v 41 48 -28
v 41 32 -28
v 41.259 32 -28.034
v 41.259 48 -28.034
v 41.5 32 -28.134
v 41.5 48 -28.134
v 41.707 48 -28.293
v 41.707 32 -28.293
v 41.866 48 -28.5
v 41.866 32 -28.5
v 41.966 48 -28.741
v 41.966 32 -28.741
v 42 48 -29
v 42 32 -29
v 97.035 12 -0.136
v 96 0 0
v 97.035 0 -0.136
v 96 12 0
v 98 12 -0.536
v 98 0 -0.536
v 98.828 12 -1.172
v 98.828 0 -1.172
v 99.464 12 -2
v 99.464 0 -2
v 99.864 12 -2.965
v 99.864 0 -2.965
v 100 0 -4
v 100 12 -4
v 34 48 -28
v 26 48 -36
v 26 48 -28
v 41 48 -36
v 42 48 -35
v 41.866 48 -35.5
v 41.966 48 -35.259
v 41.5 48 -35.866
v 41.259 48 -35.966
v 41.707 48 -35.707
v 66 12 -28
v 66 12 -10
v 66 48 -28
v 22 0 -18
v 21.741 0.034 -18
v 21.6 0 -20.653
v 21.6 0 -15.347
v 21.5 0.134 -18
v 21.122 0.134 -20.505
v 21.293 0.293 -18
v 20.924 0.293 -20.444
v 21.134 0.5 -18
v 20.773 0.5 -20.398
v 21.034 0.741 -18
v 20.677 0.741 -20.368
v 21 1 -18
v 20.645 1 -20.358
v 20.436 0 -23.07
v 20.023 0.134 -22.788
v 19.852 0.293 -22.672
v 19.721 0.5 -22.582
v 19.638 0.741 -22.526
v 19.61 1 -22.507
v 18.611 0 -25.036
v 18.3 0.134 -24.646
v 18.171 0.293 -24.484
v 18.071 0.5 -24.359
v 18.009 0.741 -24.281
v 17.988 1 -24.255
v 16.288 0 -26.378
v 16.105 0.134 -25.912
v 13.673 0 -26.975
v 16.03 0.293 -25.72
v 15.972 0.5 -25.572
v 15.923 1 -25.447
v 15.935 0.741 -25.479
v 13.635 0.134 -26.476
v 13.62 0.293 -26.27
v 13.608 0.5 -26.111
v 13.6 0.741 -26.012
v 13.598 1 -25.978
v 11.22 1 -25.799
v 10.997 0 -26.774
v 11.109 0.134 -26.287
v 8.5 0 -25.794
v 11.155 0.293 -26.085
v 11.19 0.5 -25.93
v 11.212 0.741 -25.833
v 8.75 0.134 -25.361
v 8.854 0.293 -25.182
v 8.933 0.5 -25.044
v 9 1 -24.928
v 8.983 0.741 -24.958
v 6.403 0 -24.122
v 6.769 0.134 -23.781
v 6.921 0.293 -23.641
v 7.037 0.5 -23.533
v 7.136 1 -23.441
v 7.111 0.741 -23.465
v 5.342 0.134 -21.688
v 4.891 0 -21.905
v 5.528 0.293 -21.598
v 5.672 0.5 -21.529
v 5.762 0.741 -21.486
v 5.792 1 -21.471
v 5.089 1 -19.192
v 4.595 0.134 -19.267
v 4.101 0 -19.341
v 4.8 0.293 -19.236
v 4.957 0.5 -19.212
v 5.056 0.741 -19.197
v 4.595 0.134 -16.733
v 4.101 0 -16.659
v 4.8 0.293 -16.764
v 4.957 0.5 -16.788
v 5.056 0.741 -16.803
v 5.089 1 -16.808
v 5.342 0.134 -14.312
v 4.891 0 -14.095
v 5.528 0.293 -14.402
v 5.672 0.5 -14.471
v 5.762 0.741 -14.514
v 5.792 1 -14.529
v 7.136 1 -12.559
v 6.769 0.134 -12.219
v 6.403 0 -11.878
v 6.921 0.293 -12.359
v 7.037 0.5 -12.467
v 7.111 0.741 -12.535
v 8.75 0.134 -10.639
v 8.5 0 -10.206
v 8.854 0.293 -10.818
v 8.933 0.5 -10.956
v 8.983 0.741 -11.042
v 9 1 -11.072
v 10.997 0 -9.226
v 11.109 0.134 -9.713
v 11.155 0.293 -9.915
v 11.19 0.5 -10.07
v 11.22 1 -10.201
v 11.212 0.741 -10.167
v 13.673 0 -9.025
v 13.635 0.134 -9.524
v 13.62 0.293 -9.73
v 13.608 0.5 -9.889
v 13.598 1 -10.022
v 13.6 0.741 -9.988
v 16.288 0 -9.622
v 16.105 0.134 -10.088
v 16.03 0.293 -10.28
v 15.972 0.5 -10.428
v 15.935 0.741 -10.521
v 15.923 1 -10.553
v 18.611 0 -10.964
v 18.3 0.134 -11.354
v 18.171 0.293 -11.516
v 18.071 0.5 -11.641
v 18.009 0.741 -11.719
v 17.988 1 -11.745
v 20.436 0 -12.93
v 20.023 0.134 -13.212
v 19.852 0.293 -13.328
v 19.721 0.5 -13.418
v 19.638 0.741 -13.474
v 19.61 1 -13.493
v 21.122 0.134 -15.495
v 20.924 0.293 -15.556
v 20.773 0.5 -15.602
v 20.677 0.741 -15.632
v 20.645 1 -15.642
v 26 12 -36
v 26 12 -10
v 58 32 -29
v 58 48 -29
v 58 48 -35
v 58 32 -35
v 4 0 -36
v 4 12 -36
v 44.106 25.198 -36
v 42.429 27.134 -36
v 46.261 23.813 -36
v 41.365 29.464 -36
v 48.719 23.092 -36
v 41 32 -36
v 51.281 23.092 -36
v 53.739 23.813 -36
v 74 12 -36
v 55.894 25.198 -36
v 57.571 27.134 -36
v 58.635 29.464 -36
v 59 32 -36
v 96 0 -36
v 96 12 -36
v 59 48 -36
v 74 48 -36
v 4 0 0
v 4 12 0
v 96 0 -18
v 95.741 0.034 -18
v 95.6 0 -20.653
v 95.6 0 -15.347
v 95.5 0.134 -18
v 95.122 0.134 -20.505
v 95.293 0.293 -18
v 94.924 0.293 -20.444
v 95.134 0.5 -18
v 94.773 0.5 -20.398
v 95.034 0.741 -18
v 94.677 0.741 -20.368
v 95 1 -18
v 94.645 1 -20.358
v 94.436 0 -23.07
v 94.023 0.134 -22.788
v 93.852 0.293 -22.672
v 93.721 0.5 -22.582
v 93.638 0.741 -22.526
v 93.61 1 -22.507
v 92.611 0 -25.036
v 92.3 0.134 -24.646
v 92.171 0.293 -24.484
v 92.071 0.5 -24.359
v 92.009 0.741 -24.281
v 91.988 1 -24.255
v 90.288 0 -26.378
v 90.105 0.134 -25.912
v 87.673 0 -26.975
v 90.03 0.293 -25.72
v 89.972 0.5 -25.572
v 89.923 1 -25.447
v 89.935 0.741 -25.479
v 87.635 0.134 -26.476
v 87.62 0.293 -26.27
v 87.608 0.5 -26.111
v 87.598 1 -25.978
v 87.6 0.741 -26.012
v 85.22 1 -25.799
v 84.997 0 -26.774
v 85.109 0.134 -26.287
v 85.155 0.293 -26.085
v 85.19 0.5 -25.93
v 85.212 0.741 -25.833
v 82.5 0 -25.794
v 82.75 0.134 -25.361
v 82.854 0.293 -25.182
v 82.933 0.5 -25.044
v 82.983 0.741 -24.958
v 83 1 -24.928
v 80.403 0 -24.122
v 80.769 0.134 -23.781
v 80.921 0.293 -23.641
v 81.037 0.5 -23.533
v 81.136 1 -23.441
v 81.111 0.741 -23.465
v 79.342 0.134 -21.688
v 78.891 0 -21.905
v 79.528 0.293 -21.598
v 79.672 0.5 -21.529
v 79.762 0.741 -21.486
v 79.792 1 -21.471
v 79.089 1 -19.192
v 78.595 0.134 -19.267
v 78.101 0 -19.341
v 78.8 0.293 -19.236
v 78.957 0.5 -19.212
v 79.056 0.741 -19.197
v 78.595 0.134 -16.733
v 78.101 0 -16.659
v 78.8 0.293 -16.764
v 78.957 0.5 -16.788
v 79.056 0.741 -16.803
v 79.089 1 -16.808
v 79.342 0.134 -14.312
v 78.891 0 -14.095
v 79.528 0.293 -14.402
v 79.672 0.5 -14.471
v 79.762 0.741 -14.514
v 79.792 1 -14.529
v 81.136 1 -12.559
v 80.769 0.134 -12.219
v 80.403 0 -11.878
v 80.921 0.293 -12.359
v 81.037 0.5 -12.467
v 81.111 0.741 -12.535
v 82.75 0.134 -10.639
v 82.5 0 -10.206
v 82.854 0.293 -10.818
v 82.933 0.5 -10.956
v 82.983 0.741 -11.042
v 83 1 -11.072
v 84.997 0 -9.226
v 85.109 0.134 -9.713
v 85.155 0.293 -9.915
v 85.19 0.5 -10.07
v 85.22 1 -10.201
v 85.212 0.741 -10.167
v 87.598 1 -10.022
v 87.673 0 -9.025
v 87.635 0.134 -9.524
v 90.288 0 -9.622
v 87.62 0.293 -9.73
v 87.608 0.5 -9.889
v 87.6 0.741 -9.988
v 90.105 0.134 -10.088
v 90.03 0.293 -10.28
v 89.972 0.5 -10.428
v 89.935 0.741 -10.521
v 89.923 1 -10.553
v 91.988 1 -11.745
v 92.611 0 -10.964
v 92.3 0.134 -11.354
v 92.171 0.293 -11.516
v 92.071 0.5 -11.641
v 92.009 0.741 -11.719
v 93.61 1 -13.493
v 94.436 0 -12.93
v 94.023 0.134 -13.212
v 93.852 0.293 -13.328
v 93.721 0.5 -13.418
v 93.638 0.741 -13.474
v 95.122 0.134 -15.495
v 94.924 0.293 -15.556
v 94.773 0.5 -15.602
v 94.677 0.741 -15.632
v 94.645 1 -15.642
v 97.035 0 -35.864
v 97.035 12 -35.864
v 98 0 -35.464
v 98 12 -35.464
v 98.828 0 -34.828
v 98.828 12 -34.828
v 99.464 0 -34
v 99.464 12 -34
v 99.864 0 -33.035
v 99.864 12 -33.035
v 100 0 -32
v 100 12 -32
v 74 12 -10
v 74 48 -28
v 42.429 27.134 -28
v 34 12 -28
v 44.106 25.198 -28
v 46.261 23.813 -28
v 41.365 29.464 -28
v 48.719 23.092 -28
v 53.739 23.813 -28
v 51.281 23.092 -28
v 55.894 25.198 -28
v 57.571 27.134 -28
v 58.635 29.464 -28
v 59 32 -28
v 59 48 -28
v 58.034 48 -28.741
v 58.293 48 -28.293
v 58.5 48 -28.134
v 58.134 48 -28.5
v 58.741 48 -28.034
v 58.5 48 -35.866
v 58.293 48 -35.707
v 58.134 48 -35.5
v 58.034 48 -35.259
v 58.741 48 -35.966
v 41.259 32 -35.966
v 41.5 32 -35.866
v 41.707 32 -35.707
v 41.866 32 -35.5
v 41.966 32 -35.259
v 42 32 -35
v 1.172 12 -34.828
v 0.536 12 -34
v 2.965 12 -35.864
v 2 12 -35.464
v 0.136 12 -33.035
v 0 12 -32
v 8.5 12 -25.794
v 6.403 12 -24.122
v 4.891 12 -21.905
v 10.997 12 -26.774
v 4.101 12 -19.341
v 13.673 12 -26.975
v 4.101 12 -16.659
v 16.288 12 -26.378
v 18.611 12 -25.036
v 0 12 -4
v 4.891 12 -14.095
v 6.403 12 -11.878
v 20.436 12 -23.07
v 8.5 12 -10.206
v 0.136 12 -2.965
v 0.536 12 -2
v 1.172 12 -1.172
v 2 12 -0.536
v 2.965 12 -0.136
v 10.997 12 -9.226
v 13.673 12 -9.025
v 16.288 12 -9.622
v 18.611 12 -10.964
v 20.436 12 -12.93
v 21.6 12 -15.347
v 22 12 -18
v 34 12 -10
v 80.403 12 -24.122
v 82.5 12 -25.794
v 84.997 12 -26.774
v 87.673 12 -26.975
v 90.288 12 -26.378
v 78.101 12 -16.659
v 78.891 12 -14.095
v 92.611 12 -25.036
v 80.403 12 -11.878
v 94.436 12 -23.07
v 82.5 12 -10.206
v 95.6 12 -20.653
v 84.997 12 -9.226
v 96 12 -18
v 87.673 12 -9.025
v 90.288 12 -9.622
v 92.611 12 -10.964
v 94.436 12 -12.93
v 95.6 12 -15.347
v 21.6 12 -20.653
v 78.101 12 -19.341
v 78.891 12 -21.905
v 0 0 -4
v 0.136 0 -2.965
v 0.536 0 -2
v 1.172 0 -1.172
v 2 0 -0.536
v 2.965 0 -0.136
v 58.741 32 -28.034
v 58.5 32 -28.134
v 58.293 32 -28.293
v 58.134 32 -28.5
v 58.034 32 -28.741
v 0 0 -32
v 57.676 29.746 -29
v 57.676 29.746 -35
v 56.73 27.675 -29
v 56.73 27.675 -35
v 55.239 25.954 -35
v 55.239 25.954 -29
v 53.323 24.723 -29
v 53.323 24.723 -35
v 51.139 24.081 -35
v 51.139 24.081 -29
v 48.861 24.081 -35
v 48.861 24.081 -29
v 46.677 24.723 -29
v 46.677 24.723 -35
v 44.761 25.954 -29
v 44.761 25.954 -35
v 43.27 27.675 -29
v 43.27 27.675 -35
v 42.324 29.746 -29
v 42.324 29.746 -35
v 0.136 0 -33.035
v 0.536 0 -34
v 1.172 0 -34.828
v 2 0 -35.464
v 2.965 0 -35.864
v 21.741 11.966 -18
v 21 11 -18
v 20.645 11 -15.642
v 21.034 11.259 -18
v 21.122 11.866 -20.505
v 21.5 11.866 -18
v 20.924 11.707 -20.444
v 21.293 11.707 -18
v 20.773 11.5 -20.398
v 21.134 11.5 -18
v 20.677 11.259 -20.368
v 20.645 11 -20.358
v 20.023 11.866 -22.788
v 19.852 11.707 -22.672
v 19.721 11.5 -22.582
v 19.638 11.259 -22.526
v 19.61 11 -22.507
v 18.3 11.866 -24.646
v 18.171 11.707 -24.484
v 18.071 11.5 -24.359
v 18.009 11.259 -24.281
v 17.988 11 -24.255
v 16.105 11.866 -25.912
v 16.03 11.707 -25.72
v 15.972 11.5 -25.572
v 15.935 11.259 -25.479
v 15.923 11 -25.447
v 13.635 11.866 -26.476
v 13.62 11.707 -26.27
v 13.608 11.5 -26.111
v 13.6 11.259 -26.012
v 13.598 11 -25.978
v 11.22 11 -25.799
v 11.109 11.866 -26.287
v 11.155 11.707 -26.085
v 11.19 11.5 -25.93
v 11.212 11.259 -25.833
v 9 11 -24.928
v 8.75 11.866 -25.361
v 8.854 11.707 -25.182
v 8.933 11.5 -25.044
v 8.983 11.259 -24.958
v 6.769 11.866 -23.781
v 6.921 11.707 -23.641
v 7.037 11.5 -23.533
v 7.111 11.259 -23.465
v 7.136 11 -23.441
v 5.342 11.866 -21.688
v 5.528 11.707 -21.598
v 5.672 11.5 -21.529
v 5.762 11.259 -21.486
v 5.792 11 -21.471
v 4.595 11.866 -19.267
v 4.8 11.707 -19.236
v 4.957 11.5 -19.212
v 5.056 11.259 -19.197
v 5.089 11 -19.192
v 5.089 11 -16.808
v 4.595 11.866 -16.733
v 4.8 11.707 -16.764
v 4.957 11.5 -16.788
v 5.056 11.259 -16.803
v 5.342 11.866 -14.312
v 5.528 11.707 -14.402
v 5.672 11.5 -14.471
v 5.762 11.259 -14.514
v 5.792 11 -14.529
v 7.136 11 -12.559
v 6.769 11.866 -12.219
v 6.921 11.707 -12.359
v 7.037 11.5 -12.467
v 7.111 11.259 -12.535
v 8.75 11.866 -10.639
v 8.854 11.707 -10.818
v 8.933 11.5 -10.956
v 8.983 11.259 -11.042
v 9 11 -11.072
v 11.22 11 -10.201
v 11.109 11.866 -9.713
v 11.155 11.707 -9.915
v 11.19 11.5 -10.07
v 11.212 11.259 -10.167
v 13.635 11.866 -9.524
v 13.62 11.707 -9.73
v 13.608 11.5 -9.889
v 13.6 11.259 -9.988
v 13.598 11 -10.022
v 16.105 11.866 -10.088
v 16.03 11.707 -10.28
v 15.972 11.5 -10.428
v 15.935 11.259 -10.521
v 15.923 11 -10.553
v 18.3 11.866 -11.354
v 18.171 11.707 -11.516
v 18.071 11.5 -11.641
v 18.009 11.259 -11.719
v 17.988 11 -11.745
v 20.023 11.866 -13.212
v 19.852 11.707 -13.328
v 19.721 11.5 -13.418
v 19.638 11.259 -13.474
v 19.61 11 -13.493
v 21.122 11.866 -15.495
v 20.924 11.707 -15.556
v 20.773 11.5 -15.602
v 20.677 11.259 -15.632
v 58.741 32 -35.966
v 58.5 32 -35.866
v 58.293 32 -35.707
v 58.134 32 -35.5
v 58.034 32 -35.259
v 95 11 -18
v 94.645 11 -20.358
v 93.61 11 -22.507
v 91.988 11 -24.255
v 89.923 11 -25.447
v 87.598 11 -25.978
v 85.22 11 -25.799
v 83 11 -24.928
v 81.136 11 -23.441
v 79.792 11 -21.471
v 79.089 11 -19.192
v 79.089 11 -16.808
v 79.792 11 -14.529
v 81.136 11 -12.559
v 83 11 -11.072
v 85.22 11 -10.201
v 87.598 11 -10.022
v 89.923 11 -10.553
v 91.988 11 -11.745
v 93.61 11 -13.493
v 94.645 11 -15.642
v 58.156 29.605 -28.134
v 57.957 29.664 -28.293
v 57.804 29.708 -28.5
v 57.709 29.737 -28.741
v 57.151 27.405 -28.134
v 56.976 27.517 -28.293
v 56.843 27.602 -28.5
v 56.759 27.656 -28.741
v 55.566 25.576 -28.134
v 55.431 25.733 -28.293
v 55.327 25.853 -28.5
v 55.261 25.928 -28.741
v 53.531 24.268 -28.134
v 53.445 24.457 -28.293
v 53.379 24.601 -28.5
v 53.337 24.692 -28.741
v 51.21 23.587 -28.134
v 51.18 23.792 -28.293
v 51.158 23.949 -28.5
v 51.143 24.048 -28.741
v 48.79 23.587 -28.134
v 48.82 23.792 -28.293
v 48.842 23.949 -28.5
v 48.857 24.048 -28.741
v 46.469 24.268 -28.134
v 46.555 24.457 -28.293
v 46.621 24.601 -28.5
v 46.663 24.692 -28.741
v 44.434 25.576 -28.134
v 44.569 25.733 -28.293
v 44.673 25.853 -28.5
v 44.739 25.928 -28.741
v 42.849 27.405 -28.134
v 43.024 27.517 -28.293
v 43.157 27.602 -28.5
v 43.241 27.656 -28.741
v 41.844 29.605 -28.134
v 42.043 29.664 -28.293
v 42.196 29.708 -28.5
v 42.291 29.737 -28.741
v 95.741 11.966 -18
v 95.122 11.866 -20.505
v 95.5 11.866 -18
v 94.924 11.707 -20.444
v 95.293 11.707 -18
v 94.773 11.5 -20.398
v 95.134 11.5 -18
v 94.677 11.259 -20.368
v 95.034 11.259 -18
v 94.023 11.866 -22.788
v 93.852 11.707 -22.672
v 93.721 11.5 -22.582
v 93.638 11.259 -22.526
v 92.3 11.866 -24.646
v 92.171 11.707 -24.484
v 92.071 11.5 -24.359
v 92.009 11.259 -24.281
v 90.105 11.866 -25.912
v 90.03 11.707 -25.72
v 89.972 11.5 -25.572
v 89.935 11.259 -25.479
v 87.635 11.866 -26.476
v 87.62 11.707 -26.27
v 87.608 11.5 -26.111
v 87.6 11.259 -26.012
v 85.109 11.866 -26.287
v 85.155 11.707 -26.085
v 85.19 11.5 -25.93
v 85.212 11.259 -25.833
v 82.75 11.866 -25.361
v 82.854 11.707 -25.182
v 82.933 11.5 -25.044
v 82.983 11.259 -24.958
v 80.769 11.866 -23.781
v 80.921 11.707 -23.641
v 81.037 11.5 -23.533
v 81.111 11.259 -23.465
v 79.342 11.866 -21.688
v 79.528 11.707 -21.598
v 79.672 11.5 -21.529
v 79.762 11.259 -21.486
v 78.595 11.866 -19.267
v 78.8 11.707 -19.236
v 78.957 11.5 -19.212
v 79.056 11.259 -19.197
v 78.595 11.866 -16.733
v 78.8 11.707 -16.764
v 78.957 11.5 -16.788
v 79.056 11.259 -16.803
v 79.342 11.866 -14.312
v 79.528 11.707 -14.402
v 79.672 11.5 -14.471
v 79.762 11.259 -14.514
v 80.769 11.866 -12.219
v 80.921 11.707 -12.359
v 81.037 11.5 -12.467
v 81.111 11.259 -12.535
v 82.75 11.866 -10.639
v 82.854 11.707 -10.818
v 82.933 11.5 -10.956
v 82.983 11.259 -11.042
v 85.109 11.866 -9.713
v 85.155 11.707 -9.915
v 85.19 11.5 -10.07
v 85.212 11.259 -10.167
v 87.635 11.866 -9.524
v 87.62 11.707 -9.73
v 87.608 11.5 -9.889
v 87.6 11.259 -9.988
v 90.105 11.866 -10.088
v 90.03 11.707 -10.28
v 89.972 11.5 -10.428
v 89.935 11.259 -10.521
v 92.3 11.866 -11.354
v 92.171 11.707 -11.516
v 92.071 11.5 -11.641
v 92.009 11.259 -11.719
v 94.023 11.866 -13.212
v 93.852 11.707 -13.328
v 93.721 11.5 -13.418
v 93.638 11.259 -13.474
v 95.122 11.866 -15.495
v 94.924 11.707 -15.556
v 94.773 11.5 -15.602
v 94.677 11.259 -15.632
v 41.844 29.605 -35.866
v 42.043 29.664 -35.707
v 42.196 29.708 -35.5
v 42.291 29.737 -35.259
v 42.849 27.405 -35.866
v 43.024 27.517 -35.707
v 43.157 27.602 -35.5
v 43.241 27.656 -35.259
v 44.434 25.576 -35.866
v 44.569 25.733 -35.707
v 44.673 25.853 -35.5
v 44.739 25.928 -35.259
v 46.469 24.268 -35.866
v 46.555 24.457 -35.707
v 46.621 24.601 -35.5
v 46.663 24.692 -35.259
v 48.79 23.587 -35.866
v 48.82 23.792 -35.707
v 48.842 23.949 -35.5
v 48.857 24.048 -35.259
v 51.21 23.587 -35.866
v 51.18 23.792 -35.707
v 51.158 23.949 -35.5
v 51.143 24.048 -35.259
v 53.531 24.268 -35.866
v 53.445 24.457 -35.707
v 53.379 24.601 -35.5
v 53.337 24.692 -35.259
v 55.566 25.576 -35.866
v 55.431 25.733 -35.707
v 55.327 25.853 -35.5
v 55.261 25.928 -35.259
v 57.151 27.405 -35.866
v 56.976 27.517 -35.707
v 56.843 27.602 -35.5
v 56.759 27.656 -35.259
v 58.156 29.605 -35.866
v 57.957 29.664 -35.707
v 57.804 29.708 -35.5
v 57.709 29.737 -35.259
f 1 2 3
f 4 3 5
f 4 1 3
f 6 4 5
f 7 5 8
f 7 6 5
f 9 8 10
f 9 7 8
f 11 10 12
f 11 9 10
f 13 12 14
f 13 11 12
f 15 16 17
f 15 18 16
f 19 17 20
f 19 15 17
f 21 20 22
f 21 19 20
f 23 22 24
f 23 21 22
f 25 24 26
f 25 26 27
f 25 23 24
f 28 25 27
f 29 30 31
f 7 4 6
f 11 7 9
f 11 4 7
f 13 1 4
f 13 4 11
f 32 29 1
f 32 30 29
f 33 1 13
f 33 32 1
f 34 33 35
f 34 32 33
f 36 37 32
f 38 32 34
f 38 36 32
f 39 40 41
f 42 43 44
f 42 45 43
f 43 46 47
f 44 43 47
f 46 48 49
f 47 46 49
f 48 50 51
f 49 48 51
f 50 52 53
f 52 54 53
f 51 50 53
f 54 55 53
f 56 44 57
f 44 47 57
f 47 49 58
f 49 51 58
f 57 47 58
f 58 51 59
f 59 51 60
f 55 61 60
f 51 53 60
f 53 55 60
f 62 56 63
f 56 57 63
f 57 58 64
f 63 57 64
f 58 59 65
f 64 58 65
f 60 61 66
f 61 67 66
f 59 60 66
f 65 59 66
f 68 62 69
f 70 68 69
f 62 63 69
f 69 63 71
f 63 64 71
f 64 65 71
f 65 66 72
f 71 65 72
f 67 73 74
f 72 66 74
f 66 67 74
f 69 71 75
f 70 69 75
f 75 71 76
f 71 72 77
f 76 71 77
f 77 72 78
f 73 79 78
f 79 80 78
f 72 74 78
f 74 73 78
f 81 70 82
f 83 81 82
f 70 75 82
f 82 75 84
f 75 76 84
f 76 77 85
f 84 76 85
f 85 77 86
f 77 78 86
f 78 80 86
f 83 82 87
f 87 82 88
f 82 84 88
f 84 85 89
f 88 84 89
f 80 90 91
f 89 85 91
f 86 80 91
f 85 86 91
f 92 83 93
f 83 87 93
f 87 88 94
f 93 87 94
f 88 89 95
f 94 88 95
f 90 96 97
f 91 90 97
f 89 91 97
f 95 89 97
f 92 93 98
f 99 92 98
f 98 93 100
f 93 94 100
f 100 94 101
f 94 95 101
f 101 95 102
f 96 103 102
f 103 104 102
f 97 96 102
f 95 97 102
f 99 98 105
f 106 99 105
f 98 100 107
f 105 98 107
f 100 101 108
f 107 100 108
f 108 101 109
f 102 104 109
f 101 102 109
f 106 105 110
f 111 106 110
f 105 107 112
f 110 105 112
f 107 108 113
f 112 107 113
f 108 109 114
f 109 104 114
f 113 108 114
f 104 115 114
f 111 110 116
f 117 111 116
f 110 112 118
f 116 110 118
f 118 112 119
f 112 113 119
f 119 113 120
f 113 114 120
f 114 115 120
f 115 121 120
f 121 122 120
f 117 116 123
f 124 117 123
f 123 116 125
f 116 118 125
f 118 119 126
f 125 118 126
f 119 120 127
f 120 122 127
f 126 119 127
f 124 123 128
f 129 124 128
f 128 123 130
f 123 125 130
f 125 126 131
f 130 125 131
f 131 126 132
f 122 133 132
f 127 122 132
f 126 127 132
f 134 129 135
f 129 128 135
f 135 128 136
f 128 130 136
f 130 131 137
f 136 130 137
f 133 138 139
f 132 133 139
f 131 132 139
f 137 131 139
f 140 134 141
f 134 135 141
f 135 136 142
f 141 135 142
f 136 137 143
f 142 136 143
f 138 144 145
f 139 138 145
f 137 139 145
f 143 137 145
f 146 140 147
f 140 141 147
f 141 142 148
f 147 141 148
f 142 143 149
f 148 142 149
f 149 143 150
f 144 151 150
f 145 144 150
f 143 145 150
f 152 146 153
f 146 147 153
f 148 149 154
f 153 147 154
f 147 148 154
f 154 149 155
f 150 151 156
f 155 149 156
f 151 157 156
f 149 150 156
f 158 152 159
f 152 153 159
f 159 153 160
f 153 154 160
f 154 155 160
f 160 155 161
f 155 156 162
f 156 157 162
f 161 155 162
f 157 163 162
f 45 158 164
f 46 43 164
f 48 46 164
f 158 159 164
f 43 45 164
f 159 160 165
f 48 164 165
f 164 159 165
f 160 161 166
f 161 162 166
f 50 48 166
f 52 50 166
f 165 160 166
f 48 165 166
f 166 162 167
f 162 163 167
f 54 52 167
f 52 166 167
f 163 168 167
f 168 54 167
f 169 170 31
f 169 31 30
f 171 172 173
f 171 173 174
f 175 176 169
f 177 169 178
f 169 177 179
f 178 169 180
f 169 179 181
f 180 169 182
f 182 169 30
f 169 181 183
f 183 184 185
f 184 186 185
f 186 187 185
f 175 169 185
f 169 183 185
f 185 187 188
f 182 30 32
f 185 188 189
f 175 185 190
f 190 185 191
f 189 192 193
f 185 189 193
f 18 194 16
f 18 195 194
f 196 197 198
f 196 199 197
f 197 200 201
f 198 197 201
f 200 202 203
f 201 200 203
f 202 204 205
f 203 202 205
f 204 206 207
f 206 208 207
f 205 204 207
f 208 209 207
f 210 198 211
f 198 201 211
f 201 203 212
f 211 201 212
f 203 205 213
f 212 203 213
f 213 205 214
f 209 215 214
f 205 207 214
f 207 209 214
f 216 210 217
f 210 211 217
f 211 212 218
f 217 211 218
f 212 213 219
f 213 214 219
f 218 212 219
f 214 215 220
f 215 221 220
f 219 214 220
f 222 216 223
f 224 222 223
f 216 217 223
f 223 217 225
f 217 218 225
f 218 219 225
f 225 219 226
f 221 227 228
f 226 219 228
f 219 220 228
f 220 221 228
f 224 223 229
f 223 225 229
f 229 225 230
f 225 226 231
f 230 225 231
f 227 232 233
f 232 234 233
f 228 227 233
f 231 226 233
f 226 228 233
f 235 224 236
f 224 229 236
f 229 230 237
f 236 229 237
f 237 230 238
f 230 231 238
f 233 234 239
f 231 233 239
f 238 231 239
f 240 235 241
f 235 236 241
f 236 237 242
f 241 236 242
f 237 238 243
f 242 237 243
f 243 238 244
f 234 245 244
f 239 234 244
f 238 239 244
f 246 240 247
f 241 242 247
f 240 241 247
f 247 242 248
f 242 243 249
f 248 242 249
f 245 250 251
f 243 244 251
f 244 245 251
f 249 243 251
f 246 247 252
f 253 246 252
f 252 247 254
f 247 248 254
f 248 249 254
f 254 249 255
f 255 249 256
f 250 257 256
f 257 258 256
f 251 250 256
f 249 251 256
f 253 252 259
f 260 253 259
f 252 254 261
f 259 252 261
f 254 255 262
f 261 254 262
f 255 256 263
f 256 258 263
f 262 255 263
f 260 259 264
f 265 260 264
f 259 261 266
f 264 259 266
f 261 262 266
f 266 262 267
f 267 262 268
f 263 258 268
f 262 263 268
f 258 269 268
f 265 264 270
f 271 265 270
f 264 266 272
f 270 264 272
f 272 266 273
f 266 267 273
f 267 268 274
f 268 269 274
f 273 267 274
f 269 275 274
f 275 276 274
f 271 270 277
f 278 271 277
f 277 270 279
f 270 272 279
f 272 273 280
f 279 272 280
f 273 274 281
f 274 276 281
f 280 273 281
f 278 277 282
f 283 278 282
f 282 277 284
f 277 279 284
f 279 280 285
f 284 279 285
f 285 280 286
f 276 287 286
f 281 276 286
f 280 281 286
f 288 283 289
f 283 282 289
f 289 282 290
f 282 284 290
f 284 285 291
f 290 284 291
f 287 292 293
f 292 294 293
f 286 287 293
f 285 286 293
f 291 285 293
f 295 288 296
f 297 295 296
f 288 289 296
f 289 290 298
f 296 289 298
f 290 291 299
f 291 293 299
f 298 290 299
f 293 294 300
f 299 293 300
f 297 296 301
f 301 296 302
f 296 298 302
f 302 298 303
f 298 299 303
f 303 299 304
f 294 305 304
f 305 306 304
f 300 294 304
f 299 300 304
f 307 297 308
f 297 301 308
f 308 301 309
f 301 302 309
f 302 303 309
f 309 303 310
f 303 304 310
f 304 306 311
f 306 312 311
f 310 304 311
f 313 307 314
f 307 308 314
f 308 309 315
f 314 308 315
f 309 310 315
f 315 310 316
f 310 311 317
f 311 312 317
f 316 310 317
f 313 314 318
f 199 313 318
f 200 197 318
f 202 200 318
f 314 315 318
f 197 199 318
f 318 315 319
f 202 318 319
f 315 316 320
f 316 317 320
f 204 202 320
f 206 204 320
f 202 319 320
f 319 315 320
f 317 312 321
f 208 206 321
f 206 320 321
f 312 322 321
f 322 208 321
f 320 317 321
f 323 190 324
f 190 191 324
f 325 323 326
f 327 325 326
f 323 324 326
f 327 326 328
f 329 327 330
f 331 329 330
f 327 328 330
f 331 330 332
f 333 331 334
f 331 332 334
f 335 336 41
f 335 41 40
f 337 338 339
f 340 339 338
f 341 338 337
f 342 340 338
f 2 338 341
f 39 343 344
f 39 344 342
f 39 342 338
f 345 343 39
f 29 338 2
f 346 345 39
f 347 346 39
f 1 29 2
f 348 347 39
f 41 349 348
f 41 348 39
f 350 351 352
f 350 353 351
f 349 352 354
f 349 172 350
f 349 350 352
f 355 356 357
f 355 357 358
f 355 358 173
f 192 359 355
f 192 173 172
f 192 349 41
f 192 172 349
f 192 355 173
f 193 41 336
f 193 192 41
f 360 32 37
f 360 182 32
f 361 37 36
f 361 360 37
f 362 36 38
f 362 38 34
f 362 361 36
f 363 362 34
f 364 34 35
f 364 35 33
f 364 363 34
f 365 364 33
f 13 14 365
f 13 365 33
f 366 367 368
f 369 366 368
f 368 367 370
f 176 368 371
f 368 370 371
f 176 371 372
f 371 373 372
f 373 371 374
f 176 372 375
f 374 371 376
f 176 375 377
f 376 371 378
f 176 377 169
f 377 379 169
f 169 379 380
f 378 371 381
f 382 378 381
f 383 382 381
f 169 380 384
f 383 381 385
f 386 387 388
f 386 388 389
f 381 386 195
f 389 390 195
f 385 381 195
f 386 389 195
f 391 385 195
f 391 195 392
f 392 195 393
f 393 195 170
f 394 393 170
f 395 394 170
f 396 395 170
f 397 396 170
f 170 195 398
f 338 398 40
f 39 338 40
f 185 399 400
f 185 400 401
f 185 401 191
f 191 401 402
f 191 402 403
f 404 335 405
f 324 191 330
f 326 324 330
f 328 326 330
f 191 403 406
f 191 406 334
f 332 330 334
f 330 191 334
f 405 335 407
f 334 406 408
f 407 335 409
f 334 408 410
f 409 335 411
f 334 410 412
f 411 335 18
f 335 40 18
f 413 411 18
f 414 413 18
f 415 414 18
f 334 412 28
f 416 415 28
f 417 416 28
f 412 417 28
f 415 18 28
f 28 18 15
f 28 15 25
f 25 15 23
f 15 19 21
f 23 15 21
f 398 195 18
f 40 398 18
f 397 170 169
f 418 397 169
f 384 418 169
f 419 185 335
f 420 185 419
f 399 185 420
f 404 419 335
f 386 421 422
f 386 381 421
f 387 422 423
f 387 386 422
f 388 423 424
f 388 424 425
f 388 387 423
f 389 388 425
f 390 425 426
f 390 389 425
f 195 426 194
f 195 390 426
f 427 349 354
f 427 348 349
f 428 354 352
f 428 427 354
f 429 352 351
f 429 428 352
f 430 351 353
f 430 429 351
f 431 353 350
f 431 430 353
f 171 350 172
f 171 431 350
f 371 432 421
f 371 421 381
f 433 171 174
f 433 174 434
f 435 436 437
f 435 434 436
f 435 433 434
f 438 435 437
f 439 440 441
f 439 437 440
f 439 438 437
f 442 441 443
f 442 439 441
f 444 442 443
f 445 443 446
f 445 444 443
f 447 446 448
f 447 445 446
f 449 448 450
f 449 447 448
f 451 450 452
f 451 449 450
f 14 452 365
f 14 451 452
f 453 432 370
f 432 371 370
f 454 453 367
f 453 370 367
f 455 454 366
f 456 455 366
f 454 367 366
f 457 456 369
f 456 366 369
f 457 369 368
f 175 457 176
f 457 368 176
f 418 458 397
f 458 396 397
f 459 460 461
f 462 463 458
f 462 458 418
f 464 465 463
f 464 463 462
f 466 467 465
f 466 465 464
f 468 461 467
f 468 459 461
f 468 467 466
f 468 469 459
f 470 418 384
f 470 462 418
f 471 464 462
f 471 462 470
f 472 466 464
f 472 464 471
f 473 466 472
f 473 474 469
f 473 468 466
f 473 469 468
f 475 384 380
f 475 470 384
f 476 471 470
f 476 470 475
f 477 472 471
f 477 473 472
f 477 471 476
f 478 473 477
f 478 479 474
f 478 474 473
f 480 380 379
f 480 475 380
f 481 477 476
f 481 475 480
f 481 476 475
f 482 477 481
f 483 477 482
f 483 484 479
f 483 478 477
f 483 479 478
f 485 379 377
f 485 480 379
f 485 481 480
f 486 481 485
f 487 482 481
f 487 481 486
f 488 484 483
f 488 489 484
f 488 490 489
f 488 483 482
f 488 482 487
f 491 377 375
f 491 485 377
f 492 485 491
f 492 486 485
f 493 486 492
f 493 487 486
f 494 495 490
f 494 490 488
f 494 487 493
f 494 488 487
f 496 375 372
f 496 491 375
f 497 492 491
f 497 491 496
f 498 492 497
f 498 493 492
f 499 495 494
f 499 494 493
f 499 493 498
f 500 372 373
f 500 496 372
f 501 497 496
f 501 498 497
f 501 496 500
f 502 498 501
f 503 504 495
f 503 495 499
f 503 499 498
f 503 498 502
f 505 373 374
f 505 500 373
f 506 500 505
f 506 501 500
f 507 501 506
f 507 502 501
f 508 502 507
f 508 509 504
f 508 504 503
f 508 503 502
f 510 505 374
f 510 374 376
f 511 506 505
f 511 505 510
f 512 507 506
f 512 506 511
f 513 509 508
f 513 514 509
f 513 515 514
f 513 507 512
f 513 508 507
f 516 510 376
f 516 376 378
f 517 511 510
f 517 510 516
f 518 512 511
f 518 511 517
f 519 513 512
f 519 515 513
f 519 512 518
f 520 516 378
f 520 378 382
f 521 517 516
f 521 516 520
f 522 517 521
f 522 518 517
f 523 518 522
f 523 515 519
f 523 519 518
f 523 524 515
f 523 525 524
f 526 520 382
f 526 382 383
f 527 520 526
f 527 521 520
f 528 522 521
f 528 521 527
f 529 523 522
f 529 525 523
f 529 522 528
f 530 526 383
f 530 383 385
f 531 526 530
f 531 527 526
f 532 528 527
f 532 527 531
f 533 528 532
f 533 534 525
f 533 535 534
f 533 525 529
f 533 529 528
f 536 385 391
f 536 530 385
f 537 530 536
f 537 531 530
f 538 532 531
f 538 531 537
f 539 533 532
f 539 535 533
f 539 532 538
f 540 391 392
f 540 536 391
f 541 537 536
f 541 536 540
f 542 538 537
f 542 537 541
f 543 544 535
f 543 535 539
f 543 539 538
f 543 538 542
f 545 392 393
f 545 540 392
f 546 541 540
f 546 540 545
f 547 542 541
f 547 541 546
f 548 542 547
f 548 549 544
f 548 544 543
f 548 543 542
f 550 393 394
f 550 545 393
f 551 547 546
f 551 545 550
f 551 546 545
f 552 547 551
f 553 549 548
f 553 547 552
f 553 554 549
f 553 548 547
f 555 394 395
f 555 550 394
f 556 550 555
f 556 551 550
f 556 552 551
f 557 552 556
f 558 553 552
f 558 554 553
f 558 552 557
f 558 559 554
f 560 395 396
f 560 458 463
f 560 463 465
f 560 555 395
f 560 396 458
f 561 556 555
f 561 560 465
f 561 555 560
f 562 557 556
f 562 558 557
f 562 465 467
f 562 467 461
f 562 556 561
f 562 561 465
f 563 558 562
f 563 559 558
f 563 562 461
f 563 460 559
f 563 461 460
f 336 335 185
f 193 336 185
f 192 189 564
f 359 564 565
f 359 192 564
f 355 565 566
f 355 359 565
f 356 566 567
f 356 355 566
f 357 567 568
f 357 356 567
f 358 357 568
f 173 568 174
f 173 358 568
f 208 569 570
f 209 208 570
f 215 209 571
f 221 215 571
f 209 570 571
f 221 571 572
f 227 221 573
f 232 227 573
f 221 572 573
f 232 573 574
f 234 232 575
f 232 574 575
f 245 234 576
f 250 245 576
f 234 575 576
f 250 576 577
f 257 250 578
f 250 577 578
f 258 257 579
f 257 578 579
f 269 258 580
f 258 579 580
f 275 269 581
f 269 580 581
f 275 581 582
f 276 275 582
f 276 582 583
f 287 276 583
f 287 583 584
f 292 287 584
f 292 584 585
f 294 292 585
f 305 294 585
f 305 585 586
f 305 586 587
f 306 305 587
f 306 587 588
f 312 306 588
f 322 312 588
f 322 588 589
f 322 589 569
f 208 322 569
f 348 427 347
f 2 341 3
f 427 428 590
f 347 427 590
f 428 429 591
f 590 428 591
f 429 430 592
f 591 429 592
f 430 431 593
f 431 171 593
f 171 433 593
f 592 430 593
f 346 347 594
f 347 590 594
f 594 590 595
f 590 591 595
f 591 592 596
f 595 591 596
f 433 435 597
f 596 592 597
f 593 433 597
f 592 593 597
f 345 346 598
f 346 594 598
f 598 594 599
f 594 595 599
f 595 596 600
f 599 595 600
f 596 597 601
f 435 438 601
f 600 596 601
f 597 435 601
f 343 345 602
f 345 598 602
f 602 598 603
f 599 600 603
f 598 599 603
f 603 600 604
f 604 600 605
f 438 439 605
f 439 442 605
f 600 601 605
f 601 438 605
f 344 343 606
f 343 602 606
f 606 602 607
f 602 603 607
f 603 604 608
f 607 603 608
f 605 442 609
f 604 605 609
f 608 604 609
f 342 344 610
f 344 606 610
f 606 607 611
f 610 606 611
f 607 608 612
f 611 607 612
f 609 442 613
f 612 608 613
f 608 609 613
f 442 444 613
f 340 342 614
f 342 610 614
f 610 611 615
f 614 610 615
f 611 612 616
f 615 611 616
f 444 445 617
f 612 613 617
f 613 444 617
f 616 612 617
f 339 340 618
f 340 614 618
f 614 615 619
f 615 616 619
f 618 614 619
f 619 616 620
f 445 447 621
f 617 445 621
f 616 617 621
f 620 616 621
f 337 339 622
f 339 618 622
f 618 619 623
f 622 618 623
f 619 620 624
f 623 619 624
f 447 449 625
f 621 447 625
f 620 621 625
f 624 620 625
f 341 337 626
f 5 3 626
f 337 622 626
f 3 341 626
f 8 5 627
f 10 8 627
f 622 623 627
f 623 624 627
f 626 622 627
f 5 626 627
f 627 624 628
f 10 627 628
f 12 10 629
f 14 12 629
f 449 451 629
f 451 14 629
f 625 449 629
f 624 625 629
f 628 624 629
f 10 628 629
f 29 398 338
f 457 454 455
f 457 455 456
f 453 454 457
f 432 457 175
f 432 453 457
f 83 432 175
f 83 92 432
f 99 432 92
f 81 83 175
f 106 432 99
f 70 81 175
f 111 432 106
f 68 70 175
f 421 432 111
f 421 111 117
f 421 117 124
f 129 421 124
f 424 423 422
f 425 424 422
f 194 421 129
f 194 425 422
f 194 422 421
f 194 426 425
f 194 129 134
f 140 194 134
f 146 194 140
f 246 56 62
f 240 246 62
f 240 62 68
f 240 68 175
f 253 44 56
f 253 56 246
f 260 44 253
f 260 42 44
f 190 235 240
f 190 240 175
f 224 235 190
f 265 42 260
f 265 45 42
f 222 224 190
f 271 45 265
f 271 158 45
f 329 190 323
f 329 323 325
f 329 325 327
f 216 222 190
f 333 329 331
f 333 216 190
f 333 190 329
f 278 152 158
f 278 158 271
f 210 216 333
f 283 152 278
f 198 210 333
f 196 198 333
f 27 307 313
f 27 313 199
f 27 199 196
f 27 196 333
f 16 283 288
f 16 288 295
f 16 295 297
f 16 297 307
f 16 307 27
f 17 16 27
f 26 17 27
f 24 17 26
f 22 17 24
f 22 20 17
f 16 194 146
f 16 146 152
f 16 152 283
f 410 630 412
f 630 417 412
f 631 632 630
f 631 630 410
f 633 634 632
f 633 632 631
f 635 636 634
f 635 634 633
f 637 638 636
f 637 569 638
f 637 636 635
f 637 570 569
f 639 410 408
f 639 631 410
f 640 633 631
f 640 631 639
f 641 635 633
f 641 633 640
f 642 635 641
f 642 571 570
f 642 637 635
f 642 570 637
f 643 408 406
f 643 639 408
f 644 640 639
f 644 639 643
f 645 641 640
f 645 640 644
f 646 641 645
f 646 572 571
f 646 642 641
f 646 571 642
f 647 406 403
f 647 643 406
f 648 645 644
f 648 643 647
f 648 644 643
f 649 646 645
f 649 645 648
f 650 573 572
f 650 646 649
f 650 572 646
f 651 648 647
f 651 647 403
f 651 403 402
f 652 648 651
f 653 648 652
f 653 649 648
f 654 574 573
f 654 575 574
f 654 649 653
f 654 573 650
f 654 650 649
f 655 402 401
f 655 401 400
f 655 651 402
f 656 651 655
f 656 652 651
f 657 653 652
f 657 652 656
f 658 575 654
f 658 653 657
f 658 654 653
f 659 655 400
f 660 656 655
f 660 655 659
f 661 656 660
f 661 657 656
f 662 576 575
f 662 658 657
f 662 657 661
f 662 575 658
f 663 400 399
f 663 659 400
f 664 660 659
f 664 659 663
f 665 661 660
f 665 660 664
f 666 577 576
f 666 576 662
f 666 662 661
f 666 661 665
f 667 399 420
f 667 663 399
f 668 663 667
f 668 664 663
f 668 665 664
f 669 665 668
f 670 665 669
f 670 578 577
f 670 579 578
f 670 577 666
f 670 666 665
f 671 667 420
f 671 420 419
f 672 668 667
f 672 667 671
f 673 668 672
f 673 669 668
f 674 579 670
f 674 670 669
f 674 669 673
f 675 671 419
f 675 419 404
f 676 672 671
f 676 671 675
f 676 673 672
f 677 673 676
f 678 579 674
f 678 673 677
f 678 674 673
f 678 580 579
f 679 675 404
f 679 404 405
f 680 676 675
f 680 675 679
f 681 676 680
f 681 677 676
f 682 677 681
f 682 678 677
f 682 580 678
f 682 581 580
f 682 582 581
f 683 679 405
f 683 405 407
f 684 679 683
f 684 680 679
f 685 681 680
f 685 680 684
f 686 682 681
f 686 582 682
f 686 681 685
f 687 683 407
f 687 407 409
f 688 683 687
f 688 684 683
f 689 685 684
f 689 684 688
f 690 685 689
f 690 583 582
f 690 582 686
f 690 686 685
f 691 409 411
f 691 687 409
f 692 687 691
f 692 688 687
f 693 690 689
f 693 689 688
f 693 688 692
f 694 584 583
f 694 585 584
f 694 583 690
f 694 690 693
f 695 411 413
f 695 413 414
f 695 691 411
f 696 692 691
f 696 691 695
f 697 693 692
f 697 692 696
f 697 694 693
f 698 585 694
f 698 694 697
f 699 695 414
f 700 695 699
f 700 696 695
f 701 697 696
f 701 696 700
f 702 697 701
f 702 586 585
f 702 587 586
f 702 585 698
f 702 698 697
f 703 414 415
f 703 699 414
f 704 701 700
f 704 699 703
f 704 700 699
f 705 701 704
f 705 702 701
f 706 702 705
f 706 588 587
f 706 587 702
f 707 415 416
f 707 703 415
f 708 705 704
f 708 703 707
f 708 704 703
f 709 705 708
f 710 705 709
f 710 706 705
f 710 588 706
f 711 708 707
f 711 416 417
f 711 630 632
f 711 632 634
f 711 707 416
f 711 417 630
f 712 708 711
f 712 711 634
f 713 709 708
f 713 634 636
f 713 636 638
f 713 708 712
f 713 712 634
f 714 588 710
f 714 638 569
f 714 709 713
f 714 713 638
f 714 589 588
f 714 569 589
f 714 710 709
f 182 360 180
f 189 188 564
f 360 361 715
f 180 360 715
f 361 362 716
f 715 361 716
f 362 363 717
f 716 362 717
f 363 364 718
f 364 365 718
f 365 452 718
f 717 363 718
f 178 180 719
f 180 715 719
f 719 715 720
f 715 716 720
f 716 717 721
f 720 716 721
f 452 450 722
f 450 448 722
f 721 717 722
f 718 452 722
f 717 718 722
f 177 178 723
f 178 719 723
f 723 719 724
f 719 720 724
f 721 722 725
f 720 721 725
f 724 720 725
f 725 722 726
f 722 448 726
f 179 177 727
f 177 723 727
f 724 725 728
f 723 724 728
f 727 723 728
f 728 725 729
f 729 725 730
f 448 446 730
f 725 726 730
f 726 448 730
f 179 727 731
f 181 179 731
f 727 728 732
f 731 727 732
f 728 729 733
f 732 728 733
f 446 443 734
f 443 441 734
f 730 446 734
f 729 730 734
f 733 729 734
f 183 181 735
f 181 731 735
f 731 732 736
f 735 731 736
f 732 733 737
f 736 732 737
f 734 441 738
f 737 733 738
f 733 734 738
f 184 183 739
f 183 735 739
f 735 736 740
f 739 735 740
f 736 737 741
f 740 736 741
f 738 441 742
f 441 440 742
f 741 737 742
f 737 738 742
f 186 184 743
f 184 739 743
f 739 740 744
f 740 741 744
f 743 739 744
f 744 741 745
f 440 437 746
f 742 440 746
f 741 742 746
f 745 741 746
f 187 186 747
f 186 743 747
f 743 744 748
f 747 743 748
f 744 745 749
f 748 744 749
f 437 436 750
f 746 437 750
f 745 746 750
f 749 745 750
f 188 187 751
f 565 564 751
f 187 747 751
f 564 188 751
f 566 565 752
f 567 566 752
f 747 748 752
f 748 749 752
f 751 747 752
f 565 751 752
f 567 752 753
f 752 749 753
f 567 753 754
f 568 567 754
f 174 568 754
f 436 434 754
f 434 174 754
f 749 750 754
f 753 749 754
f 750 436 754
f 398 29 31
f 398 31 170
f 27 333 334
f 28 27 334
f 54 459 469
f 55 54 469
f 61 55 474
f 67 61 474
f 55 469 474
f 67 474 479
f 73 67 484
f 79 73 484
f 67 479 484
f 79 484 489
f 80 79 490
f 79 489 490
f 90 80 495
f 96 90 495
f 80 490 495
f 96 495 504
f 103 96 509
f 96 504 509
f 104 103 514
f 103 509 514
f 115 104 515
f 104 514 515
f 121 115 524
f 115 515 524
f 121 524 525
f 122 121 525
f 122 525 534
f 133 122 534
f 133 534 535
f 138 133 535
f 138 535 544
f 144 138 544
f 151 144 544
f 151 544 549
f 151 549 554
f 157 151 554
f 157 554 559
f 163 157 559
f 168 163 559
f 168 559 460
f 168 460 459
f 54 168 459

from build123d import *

# Parameters (mm, degrees)
SKETCH1_W           = 100
SKETCH1_H           = 12
BOSS_EXTRUDE1_DEPTH = 36
SKETCH2_W           = 48
SKETCH2_H           = 26
BOSS_EXTRUDE2_DEPTH = 36
SKETCH3_W           = 32
SKETCH3_H           = 18
CUT_EXTRUDE1_DEPTH  = 36
CUT_EXTRUDE2_START  = -48
CUT_EXTRUDE2_DEPTH  = 48
CUT_EXTRUDE5_DEPTH  = 36
SKETCH6_R           = 8
CUT_EXTRUDE6_DEPTH  = 36
FILLET1_R           = 4
FILLET2_R           = 1


with BuildPart() as part:
    # Sketch1 → Boss-Extrude1 (new body)
    with BuildSketch(Plane.XY):
        with Locations((50, 6)):
            Rectangle(SKETCH1_W, SKETCH1_H)
    extrude(amount=-BOSS_EXTRUDE1_DEPTH)

    # Sketch2 → Boss-Extrude2 (add)
    with BuildSketch(Plane(origin=(0, 12, 0), x_dir=(1, 0, 0), z_dir=(0, 1, 0))):
        with Locations((50, 23)):
            Rectangle(SKETCH2_W, SKETCH2_H)
    extrude(amount=BOSS_EXTRUDE2_DEPTH)

    # Sketch3 → Cut-Extrude1 (cut)
    with BuildSketch(Plane(origin=(0, 48, 0), x_dir=(1, 0, 0), z_dir=(0, 1, 0))):
        with Locations((50, 19)):
            Rectangle(SKETCH3_W, SKETCH3_H)
    extrude(amount=-CUT_EXTRUDE1_DEPTH, mode=Mode.SUBTRACT)

    # Sketch4 → Cut-Extrude2 (cut)
    with BuildSketch(Plane.ZY.offset(-26).offset(CUT_EXTRUDE2_START)):
        Polygon((-28, 48), (-10, 12), (-10, 48), align=None)
    extrude(amount=CUT_EXTRUDE2_DEPTH, mode=Mode.SUBTRACT)

    # Sketch5 → Cut-Extrude5 (cut)
    with BuildSketch(Plane.XY.offset(-28)):
        with BuildLine():
            Line((42, 48), (58, 48))
            Line((58, 48), (58, 32))
            ThreePointArc((58, 32), (50, 24), (42, 32))
            Line((42, 32), (42, 48))
        make_face()
    extrude(amount=-CUT_EXTRUDE5_DEPTH, mode=Mode.SUBTRACT)

    # Sketch6 → Cut-Extrude6 (cut)
    with BuildSketch(Plane(origin=(0, 12, 0), x_dir=(1, 0, 0), z_dir=(0, 1, 0))):
        with Locations((13, 18)):
            Circle(SKETCH6_R)
        with Locations((87, 18)):
            Circle(SKETCH6_R)
    extrude(amount=-CUT_EXTRUDE6_DEPTH, mode=Mode.SUBTRACT)

    # Fillet1
    fillet1_edges = [part.edges().sort_by_distance(p)[0] for p in [
        (100, 6, -36),
        (0, 6, -36),
        (100, 6, 0),
        (0, 6, 0),
    ]]
    fillet(fillet1_edges, radius=FILLET1_R)

    # Fillet2
    fillet2_edges = [part.edges().sort_by_distance(p)[0] for p in [
        (50, 24, -36),
        (42, 40, -36),
        (58, 40, -36),
        (50, 24, -28),
        (58, 40, -28),
        (42, 40, -28),
        (79, 0, -18),
        (79, 12, -18),
        (5, 0, -18),
        (5, 12, -18),
    ]]
    fillet(fillet2_edges, radius=FILLET2_R)


solid = part.part
